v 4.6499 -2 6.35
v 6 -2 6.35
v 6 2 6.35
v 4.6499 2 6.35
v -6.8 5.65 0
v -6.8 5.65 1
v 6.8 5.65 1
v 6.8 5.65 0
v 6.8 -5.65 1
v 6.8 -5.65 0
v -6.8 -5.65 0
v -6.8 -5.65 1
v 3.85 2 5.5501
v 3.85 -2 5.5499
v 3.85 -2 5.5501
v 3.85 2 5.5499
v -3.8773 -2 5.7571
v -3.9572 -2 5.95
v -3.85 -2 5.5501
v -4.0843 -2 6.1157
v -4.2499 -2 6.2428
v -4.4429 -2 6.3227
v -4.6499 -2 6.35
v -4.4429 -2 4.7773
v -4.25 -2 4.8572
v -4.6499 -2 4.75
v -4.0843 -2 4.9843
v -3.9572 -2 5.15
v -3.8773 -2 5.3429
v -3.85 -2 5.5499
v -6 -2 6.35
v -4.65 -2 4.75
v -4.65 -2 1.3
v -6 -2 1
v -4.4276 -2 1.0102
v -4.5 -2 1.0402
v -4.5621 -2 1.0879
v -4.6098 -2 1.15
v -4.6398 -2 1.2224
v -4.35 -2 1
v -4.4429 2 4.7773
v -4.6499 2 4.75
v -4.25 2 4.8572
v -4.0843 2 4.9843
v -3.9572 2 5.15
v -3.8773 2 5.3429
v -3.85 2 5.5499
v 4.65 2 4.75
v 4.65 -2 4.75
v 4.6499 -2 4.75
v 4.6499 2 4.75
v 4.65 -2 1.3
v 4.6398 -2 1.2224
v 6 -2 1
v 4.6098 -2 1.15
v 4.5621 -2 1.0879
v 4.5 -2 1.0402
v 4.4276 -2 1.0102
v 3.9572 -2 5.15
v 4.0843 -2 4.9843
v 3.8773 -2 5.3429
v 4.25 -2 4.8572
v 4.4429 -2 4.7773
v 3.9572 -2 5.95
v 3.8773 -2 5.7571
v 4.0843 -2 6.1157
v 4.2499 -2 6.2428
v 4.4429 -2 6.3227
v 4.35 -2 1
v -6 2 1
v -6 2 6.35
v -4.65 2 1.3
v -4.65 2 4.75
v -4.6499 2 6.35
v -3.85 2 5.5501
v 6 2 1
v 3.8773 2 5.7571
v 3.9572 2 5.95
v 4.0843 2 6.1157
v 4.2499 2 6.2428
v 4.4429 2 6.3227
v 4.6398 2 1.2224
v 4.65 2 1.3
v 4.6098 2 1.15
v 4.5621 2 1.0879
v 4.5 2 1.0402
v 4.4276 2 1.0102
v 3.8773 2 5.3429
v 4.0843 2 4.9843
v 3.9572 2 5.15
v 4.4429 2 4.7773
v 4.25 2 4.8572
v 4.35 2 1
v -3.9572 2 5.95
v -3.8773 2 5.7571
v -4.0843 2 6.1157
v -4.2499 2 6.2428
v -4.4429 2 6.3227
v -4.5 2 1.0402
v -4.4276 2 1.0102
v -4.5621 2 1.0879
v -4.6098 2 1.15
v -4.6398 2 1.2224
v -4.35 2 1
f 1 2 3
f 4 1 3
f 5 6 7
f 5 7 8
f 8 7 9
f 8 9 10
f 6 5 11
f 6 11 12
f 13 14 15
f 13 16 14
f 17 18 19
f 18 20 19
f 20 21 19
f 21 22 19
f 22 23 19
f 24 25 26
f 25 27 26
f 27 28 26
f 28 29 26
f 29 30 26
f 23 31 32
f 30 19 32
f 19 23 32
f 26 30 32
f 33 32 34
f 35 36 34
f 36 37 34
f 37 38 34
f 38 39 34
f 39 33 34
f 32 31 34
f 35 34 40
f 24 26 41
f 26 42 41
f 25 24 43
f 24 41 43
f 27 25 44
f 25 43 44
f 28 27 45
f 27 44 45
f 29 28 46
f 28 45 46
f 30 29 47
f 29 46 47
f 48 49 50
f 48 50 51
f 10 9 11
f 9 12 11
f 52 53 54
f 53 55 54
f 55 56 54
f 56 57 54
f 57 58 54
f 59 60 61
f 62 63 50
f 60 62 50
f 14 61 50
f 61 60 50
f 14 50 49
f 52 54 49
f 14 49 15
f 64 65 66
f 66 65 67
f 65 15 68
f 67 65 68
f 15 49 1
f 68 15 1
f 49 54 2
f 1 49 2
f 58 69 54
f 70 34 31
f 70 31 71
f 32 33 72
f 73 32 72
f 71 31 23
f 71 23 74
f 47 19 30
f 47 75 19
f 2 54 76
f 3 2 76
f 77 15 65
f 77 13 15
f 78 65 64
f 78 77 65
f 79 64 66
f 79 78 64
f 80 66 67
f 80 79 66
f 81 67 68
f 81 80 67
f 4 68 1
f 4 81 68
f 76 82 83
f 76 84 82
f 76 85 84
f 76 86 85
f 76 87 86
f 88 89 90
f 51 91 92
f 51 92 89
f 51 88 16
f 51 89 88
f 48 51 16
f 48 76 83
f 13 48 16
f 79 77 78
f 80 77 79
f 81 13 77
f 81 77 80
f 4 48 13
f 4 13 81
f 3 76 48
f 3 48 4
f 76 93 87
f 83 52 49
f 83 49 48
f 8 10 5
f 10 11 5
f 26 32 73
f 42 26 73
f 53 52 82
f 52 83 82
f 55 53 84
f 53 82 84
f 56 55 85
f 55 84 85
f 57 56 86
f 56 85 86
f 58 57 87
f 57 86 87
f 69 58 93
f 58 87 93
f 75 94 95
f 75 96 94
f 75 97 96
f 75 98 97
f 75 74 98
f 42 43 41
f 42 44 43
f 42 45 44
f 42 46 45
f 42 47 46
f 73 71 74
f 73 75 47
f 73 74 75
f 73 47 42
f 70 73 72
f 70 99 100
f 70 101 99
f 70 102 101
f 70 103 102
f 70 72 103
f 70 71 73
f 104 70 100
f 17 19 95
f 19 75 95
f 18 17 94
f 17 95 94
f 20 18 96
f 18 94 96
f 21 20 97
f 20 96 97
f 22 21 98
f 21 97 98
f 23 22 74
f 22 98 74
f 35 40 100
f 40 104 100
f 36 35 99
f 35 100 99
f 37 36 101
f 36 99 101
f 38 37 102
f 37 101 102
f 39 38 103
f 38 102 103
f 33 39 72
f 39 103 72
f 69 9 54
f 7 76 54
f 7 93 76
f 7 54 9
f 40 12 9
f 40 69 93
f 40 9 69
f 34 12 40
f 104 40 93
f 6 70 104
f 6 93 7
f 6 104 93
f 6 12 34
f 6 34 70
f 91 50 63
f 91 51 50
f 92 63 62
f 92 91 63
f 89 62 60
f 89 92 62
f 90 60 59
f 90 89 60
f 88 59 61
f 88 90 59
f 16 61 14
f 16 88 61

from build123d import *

# Parameters (mm, degrees)
SKETCH_1_W      = 12
SKETCH_1_H      = 11.3
EXTRUDE_1_DEPTH = 1
SKETCH_2_W      = 1.35
SKETCH_2_H      = 4
EXTRUDE_2_DEPTH = 5.35
SKETCH_3_W      = 1.6
SKETCH_3_H      = 4
EXTRUDE_3_DEPTH = 0.8
SKETCH_4_W      = 1.6
SKETCH_4_H      = 4
EXTRUDE_4_DEPTH = 0.8
FILLET_1_R      = 0.8
FILLET_2_R      = 0.3
SKETCH_5_W      = 1
SKETCH_5_H      = 11.3
EXTRUDE_5_DEPTH = 0.8
SKETCH_6_W      = 1
SKETCH_6_H      = 11.3
EXTRUDE_6_DEPTH = 0.8


with BuildPart() as part:
    # 스케치1 → 보스-돌출1 (new body)
    with BuildSketch(Plane.XY):
        Rectangle(SKETCH_1_W, SKETCH_1_H)
    extrude(amount=EXTRUDE_1_DEPTH)

    # 스케치2 → 보스-돌출2 (add)
    with BuildSketch(Plane.XY.offset(1)):
        with Locations((-5.325, 0)):
            Rectangle(SKETCH_2_W, SKETCH_2_H)
        with Locations((5.325, 0)):
            Rectangle(SKETCH_2_W, SKETCH_2_H)
    extrude(amount=EXTRUDE_2_DEPTH)

    # 스케치3 → 보스-돌출3 (add)
    with BuildSketch(Plane(origin=(-4.65, 0, 0), x_dir=(0, 0, -1), z_dir=(1, 0, 0))):
        with Locations((-5.55, 0)):
            Rectangle(SKETCH_3_W, SKETCH_3_H)
    extrude(amount=EXTRUDE_3_DEPTH)

    # 스케치4 → 보스-돌출4 (add)
    with BuildSketch(Plane.ZY.offset(-4.65)):
        with Locations((5.55, 0)):
            Rectangle(SKETCH_4_W, SKETCH_4_H)
    extrude(amount=EXTRUDE_4_DEPTH)

    # 필렛1
    fillet_1_edges = [part.edges().sort_by_distance(p)[0] for p in [
        (3.85, 0, 6.35),
        (3.85, 0, 4.75),
        (-3.85, 0, 6.35),
        (-3.85, 0, 4.75),
    ]]
    fillet(fillet_1_edges, radius=FILLET_1_R - 0.0001)  # a hair under: the kernel refuses the full size

    # 필렛2
    fillet_2_edges = [part.edges().sort_by_distance(p)[0] for p in [
        (-4.65, 0, 1),
        (4.65, 0, 1),
    ]]
    fillet(fillet_2_edges, radius=FILLET_2_R)

    # 스케치5 → 보스-돌출5 (add)
    with BuildSketch(Plane.ZY.offset(6)):
        with Locations((0.5, 0)):
            Rectangle(SKETCH_5_W, SKETCH_5_H)
    extrude(amount=EXTRUDE_5_DEPTH)

    # 스케치6 → 보스-돌출6 (add)
    with BuildSketch(Plane(origin=(6, 0, 0), x_dir=(0, 0, -1), z_dir=(1, 0, 0))):
        with Locations((-0.5, 0)):
            Rectangle(SKETCH_6_W, SKETCH_6_H)
    extrude(amount=EXTRUDE_6_DEPTH)


solid = part.part
